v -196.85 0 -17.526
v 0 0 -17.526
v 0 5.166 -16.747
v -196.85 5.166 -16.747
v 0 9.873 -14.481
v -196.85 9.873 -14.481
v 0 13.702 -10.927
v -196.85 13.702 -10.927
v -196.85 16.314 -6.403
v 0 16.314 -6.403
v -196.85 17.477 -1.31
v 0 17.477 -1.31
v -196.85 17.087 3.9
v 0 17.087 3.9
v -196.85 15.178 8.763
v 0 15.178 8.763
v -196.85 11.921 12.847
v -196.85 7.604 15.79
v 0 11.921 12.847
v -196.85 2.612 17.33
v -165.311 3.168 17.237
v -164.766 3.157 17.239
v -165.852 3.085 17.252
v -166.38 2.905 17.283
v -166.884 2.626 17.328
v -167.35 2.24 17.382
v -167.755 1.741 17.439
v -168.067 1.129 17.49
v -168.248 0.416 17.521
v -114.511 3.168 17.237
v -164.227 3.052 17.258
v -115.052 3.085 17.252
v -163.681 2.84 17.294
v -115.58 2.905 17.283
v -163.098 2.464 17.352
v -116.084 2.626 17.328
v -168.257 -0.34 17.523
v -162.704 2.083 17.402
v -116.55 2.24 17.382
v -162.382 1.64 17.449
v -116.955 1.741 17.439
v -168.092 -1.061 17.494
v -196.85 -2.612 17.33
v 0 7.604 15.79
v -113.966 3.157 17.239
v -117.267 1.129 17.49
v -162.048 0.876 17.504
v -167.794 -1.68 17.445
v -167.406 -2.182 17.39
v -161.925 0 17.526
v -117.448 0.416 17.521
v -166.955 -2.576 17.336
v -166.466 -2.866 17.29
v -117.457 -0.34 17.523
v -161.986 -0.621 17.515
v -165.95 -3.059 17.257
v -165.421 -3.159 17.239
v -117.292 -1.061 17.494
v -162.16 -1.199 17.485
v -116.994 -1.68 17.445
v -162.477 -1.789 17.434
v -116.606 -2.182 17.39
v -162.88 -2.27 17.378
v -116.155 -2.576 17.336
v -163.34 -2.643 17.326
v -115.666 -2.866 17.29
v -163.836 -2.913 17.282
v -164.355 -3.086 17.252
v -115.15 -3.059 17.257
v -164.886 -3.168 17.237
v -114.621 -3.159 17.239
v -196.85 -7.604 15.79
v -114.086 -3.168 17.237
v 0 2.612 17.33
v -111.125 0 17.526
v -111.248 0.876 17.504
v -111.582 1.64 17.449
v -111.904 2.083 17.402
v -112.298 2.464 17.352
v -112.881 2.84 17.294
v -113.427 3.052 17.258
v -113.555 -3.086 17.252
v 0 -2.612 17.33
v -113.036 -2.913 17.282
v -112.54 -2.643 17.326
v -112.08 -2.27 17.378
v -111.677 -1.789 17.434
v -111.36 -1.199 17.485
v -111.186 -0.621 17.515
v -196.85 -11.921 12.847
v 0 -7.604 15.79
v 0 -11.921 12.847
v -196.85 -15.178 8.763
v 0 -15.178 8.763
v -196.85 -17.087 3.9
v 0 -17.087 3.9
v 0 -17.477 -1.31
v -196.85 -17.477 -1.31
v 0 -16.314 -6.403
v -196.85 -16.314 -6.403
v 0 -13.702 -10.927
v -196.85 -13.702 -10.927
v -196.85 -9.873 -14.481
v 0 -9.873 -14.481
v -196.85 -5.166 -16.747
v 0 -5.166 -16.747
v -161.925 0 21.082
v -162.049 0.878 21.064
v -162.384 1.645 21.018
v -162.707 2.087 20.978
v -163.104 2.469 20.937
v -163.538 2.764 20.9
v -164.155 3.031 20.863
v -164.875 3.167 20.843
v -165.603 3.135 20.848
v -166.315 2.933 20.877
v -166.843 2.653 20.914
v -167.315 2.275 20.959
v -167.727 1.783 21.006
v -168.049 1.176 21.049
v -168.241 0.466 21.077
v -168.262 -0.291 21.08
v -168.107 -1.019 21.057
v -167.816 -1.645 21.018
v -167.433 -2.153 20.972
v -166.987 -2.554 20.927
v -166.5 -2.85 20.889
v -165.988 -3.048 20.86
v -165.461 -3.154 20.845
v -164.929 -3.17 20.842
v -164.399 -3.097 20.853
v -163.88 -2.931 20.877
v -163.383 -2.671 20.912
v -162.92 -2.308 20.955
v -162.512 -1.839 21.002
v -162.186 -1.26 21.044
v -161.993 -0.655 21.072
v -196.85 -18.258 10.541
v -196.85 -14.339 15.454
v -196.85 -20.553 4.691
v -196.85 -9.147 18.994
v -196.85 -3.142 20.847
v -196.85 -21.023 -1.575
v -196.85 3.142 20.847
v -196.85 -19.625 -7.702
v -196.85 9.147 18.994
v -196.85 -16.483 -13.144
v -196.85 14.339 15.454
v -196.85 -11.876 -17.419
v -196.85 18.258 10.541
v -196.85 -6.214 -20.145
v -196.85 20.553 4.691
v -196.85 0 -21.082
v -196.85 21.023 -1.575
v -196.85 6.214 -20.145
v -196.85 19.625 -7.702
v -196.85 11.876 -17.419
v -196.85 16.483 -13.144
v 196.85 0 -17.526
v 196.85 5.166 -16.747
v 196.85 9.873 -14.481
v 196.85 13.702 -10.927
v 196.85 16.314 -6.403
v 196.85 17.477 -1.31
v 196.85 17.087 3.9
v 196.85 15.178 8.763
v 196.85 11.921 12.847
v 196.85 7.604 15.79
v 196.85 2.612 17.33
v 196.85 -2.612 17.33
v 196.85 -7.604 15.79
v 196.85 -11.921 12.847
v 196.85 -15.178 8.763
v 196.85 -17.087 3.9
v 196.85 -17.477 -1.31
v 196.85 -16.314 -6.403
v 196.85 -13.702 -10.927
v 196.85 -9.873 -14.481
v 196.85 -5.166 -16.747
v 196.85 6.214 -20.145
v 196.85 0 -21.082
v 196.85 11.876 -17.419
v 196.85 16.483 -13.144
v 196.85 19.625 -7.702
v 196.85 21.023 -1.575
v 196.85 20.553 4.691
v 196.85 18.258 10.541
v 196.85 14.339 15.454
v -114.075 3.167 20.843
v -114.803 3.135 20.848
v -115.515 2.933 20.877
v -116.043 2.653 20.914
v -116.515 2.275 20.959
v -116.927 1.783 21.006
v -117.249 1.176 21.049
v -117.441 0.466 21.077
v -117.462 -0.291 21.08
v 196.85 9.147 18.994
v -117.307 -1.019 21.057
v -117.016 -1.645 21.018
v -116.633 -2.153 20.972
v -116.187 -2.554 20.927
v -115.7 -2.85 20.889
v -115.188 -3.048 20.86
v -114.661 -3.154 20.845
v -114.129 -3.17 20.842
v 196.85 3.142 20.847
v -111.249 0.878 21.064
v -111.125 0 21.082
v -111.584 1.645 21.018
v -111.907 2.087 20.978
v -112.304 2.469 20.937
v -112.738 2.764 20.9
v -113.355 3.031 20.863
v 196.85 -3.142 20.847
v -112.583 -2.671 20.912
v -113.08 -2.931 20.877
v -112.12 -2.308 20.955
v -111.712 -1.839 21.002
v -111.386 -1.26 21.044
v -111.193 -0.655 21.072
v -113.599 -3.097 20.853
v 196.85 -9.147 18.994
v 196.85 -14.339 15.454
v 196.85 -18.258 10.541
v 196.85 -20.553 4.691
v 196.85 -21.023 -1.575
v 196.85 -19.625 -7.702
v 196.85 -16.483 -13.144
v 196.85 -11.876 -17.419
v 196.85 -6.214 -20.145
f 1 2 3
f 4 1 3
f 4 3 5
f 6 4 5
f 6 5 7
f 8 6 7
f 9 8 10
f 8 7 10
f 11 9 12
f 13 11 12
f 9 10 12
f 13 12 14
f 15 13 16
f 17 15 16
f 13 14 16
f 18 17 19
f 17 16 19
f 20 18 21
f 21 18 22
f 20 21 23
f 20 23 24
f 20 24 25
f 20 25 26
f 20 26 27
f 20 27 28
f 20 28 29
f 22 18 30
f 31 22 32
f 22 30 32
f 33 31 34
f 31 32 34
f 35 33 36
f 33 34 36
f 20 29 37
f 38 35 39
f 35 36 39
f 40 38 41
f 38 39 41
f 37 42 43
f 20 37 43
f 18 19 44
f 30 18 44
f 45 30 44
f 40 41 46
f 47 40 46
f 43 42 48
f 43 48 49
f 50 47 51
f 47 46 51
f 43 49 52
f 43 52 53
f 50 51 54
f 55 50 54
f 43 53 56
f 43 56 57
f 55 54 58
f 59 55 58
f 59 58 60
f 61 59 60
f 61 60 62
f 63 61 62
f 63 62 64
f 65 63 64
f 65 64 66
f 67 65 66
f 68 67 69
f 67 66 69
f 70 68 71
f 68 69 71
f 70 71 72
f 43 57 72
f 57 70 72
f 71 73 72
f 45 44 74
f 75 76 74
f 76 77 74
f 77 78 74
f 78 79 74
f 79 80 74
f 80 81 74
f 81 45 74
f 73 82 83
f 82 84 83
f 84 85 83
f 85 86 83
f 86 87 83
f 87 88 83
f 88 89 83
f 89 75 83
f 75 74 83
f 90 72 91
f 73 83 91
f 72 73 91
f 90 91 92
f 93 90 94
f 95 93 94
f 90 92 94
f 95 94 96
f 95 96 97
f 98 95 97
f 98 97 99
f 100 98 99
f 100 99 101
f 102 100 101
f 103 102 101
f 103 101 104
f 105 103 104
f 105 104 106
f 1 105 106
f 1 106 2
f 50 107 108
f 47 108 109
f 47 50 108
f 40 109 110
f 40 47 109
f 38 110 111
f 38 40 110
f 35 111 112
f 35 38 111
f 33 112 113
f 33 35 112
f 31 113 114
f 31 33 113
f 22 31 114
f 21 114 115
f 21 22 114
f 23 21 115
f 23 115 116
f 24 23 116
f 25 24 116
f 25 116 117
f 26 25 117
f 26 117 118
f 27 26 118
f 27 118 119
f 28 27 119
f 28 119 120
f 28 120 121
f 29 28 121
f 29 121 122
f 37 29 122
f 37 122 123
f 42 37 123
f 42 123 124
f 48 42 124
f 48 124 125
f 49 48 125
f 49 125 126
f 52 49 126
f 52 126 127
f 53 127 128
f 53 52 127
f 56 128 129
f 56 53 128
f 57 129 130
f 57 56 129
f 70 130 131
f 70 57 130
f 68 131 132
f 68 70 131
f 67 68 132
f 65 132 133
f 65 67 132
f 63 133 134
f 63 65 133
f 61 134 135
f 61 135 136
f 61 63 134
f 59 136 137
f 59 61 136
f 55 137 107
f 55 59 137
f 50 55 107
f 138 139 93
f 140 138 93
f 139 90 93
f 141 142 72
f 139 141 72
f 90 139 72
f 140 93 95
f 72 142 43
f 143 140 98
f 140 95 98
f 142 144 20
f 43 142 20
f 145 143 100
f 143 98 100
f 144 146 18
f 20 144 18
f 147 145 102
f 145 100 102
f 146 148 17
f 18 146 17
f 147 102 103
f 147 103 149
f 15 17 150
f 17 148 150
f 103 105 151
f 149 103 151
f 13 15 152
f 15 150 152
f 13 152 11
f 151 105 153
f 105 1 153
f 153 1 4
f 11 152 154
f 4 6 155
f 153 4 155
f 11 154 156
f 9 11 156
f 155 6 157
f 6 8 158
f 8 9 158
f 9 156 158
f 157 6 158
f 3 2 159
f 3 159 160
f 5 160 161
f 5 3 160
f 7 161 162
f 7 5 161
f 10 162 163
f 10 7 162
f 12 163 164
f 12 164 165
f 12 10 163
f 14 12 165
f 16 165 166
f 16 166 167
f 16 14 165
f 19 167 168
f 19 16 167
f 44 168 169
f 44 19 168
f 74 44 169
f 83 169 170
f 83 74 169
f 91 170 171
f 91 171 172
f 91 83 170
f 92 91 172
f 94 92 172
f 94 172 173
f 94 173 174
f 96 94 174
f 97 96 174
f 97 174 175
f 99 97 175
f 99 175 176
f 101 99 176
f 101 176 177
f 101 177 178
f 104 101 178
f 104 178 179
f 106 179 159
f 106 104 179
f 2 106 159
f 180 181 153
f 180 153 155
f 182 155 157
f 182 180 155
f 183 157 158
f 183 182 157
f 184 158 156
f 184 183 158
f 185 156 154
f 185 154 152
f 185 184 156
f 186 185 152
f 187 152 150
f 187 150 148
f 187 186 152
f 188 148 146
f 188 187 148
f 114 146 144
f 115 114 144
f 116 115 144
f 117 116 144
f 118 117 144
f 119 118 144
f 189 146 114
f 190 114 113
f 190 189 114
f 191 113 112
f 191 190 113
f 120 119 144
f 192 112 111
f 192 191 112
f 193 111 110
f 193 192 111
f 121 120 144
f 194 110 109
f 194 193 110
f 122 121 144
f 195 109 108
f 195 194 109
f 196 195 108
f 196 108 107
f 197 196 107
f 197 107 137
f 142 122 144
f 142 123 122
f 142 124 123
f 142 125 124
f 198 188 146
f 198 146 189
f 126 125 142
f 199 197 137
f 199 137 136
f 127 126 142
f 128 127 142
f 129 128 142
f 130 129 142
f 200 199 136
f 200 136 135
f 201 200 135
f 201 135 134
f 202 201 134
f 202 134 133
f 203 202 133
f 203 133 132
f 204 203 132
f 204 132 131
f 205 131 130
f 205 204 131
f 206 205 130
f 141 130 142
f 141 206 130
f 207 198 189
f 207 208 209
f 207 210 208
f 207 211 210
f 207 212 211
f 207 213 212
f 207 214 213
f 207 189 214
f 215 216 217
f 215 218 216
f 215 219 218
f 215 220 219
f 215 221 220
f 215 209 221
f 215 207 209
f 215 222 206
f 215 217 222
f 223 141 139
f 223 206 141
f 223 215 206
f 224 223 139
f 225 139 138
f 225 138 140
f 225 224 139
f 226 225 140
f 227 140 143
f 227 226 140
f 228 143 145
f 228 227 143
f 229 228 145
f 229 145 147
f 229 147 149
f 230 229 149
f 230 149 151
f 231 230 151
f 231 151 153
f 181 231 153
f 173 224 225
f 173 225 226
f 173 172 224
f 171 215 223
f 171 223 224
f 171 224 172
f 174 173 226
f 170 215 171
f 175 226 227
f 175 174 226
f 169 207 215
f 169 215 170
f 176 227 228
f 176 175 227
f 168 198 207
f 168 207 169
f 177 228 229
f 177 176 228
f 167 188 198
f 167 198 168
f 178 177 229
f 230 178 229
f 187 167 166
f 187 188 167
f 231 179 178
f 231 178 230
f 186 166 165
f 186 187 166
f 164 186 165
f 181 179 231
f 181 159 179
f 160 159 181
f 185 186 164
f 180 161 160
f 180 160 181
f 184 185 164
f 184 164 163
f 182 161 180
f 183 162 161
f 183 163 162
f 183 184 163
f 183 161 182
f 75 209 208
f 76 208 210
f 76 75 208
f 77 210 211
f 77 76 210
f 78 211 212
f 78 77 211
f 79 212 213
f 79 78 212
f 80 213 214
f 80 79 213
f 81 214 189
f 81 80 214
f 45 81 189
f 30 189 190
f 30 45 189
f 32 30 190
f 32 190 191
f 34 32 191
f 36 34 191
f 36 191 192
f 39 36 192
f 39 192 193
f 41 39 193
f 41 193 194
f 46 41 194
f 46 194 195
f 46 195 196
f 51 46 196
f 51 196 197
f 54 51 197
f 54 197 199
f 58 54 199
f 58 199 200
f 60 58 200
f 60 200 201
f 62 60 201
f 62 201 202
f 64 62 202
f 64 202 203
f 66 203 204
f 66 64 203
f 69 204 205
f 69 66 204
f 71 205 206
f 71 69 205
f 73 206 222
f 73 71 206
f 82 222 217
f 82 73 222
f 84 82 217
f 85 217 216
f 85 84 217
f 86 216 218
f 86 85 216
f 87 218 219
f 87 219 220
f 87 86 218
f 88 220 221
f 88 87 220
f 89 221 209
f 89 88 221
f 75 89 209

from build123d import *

# Parameters (mm, degrees)
BOSS_EXTRUDE1_DEPTH      = 196.85
BOSS_EXTRUDE1_DEPTH_BACK = 196.85
SKETCH1_R                = 21.082
SKETCH1_R_2              = 17.526
SKETCH2_R                = 3.175
CUT_EXTRUDE1_DEPTH       = 200.095012363


with BuildPart() as part:
    # Sketch1 → Boss-Extrude1 (new, two sides: drawn at the far end of the back side and taken through both)
    with BuildSketch(Plane(origin=(0, 0, 0), x_dir=(0, 0, -1), z_dir=(1, 0, 0)).offset(-BOSS_EXTRUDE1_DEPTH_BACK)):
        Circle(SKETCH1_R)
        Circle(SKETCH1_R_2, mode=Mode.SUBTRACT)
    extrude(amount=BOSS_EXTRUDE1_DEPTH + BOSS_EXTRUDE1_DEPTH_BACK)

    # Sketch2 → Cut-Extrude1 (cut, through all)
    with BuildSketch(Plane.XY):
        with Locations((-114.3, 0)):
            Circle(SKETCH2_R)
        with Locations((-165.1, 0)):
            Circle(SKETCH2_R)
    extrude(amount=CUT_EXTRUDE1_DEPTH, mode=Mode.SUBTRACT)


solid = part.part
